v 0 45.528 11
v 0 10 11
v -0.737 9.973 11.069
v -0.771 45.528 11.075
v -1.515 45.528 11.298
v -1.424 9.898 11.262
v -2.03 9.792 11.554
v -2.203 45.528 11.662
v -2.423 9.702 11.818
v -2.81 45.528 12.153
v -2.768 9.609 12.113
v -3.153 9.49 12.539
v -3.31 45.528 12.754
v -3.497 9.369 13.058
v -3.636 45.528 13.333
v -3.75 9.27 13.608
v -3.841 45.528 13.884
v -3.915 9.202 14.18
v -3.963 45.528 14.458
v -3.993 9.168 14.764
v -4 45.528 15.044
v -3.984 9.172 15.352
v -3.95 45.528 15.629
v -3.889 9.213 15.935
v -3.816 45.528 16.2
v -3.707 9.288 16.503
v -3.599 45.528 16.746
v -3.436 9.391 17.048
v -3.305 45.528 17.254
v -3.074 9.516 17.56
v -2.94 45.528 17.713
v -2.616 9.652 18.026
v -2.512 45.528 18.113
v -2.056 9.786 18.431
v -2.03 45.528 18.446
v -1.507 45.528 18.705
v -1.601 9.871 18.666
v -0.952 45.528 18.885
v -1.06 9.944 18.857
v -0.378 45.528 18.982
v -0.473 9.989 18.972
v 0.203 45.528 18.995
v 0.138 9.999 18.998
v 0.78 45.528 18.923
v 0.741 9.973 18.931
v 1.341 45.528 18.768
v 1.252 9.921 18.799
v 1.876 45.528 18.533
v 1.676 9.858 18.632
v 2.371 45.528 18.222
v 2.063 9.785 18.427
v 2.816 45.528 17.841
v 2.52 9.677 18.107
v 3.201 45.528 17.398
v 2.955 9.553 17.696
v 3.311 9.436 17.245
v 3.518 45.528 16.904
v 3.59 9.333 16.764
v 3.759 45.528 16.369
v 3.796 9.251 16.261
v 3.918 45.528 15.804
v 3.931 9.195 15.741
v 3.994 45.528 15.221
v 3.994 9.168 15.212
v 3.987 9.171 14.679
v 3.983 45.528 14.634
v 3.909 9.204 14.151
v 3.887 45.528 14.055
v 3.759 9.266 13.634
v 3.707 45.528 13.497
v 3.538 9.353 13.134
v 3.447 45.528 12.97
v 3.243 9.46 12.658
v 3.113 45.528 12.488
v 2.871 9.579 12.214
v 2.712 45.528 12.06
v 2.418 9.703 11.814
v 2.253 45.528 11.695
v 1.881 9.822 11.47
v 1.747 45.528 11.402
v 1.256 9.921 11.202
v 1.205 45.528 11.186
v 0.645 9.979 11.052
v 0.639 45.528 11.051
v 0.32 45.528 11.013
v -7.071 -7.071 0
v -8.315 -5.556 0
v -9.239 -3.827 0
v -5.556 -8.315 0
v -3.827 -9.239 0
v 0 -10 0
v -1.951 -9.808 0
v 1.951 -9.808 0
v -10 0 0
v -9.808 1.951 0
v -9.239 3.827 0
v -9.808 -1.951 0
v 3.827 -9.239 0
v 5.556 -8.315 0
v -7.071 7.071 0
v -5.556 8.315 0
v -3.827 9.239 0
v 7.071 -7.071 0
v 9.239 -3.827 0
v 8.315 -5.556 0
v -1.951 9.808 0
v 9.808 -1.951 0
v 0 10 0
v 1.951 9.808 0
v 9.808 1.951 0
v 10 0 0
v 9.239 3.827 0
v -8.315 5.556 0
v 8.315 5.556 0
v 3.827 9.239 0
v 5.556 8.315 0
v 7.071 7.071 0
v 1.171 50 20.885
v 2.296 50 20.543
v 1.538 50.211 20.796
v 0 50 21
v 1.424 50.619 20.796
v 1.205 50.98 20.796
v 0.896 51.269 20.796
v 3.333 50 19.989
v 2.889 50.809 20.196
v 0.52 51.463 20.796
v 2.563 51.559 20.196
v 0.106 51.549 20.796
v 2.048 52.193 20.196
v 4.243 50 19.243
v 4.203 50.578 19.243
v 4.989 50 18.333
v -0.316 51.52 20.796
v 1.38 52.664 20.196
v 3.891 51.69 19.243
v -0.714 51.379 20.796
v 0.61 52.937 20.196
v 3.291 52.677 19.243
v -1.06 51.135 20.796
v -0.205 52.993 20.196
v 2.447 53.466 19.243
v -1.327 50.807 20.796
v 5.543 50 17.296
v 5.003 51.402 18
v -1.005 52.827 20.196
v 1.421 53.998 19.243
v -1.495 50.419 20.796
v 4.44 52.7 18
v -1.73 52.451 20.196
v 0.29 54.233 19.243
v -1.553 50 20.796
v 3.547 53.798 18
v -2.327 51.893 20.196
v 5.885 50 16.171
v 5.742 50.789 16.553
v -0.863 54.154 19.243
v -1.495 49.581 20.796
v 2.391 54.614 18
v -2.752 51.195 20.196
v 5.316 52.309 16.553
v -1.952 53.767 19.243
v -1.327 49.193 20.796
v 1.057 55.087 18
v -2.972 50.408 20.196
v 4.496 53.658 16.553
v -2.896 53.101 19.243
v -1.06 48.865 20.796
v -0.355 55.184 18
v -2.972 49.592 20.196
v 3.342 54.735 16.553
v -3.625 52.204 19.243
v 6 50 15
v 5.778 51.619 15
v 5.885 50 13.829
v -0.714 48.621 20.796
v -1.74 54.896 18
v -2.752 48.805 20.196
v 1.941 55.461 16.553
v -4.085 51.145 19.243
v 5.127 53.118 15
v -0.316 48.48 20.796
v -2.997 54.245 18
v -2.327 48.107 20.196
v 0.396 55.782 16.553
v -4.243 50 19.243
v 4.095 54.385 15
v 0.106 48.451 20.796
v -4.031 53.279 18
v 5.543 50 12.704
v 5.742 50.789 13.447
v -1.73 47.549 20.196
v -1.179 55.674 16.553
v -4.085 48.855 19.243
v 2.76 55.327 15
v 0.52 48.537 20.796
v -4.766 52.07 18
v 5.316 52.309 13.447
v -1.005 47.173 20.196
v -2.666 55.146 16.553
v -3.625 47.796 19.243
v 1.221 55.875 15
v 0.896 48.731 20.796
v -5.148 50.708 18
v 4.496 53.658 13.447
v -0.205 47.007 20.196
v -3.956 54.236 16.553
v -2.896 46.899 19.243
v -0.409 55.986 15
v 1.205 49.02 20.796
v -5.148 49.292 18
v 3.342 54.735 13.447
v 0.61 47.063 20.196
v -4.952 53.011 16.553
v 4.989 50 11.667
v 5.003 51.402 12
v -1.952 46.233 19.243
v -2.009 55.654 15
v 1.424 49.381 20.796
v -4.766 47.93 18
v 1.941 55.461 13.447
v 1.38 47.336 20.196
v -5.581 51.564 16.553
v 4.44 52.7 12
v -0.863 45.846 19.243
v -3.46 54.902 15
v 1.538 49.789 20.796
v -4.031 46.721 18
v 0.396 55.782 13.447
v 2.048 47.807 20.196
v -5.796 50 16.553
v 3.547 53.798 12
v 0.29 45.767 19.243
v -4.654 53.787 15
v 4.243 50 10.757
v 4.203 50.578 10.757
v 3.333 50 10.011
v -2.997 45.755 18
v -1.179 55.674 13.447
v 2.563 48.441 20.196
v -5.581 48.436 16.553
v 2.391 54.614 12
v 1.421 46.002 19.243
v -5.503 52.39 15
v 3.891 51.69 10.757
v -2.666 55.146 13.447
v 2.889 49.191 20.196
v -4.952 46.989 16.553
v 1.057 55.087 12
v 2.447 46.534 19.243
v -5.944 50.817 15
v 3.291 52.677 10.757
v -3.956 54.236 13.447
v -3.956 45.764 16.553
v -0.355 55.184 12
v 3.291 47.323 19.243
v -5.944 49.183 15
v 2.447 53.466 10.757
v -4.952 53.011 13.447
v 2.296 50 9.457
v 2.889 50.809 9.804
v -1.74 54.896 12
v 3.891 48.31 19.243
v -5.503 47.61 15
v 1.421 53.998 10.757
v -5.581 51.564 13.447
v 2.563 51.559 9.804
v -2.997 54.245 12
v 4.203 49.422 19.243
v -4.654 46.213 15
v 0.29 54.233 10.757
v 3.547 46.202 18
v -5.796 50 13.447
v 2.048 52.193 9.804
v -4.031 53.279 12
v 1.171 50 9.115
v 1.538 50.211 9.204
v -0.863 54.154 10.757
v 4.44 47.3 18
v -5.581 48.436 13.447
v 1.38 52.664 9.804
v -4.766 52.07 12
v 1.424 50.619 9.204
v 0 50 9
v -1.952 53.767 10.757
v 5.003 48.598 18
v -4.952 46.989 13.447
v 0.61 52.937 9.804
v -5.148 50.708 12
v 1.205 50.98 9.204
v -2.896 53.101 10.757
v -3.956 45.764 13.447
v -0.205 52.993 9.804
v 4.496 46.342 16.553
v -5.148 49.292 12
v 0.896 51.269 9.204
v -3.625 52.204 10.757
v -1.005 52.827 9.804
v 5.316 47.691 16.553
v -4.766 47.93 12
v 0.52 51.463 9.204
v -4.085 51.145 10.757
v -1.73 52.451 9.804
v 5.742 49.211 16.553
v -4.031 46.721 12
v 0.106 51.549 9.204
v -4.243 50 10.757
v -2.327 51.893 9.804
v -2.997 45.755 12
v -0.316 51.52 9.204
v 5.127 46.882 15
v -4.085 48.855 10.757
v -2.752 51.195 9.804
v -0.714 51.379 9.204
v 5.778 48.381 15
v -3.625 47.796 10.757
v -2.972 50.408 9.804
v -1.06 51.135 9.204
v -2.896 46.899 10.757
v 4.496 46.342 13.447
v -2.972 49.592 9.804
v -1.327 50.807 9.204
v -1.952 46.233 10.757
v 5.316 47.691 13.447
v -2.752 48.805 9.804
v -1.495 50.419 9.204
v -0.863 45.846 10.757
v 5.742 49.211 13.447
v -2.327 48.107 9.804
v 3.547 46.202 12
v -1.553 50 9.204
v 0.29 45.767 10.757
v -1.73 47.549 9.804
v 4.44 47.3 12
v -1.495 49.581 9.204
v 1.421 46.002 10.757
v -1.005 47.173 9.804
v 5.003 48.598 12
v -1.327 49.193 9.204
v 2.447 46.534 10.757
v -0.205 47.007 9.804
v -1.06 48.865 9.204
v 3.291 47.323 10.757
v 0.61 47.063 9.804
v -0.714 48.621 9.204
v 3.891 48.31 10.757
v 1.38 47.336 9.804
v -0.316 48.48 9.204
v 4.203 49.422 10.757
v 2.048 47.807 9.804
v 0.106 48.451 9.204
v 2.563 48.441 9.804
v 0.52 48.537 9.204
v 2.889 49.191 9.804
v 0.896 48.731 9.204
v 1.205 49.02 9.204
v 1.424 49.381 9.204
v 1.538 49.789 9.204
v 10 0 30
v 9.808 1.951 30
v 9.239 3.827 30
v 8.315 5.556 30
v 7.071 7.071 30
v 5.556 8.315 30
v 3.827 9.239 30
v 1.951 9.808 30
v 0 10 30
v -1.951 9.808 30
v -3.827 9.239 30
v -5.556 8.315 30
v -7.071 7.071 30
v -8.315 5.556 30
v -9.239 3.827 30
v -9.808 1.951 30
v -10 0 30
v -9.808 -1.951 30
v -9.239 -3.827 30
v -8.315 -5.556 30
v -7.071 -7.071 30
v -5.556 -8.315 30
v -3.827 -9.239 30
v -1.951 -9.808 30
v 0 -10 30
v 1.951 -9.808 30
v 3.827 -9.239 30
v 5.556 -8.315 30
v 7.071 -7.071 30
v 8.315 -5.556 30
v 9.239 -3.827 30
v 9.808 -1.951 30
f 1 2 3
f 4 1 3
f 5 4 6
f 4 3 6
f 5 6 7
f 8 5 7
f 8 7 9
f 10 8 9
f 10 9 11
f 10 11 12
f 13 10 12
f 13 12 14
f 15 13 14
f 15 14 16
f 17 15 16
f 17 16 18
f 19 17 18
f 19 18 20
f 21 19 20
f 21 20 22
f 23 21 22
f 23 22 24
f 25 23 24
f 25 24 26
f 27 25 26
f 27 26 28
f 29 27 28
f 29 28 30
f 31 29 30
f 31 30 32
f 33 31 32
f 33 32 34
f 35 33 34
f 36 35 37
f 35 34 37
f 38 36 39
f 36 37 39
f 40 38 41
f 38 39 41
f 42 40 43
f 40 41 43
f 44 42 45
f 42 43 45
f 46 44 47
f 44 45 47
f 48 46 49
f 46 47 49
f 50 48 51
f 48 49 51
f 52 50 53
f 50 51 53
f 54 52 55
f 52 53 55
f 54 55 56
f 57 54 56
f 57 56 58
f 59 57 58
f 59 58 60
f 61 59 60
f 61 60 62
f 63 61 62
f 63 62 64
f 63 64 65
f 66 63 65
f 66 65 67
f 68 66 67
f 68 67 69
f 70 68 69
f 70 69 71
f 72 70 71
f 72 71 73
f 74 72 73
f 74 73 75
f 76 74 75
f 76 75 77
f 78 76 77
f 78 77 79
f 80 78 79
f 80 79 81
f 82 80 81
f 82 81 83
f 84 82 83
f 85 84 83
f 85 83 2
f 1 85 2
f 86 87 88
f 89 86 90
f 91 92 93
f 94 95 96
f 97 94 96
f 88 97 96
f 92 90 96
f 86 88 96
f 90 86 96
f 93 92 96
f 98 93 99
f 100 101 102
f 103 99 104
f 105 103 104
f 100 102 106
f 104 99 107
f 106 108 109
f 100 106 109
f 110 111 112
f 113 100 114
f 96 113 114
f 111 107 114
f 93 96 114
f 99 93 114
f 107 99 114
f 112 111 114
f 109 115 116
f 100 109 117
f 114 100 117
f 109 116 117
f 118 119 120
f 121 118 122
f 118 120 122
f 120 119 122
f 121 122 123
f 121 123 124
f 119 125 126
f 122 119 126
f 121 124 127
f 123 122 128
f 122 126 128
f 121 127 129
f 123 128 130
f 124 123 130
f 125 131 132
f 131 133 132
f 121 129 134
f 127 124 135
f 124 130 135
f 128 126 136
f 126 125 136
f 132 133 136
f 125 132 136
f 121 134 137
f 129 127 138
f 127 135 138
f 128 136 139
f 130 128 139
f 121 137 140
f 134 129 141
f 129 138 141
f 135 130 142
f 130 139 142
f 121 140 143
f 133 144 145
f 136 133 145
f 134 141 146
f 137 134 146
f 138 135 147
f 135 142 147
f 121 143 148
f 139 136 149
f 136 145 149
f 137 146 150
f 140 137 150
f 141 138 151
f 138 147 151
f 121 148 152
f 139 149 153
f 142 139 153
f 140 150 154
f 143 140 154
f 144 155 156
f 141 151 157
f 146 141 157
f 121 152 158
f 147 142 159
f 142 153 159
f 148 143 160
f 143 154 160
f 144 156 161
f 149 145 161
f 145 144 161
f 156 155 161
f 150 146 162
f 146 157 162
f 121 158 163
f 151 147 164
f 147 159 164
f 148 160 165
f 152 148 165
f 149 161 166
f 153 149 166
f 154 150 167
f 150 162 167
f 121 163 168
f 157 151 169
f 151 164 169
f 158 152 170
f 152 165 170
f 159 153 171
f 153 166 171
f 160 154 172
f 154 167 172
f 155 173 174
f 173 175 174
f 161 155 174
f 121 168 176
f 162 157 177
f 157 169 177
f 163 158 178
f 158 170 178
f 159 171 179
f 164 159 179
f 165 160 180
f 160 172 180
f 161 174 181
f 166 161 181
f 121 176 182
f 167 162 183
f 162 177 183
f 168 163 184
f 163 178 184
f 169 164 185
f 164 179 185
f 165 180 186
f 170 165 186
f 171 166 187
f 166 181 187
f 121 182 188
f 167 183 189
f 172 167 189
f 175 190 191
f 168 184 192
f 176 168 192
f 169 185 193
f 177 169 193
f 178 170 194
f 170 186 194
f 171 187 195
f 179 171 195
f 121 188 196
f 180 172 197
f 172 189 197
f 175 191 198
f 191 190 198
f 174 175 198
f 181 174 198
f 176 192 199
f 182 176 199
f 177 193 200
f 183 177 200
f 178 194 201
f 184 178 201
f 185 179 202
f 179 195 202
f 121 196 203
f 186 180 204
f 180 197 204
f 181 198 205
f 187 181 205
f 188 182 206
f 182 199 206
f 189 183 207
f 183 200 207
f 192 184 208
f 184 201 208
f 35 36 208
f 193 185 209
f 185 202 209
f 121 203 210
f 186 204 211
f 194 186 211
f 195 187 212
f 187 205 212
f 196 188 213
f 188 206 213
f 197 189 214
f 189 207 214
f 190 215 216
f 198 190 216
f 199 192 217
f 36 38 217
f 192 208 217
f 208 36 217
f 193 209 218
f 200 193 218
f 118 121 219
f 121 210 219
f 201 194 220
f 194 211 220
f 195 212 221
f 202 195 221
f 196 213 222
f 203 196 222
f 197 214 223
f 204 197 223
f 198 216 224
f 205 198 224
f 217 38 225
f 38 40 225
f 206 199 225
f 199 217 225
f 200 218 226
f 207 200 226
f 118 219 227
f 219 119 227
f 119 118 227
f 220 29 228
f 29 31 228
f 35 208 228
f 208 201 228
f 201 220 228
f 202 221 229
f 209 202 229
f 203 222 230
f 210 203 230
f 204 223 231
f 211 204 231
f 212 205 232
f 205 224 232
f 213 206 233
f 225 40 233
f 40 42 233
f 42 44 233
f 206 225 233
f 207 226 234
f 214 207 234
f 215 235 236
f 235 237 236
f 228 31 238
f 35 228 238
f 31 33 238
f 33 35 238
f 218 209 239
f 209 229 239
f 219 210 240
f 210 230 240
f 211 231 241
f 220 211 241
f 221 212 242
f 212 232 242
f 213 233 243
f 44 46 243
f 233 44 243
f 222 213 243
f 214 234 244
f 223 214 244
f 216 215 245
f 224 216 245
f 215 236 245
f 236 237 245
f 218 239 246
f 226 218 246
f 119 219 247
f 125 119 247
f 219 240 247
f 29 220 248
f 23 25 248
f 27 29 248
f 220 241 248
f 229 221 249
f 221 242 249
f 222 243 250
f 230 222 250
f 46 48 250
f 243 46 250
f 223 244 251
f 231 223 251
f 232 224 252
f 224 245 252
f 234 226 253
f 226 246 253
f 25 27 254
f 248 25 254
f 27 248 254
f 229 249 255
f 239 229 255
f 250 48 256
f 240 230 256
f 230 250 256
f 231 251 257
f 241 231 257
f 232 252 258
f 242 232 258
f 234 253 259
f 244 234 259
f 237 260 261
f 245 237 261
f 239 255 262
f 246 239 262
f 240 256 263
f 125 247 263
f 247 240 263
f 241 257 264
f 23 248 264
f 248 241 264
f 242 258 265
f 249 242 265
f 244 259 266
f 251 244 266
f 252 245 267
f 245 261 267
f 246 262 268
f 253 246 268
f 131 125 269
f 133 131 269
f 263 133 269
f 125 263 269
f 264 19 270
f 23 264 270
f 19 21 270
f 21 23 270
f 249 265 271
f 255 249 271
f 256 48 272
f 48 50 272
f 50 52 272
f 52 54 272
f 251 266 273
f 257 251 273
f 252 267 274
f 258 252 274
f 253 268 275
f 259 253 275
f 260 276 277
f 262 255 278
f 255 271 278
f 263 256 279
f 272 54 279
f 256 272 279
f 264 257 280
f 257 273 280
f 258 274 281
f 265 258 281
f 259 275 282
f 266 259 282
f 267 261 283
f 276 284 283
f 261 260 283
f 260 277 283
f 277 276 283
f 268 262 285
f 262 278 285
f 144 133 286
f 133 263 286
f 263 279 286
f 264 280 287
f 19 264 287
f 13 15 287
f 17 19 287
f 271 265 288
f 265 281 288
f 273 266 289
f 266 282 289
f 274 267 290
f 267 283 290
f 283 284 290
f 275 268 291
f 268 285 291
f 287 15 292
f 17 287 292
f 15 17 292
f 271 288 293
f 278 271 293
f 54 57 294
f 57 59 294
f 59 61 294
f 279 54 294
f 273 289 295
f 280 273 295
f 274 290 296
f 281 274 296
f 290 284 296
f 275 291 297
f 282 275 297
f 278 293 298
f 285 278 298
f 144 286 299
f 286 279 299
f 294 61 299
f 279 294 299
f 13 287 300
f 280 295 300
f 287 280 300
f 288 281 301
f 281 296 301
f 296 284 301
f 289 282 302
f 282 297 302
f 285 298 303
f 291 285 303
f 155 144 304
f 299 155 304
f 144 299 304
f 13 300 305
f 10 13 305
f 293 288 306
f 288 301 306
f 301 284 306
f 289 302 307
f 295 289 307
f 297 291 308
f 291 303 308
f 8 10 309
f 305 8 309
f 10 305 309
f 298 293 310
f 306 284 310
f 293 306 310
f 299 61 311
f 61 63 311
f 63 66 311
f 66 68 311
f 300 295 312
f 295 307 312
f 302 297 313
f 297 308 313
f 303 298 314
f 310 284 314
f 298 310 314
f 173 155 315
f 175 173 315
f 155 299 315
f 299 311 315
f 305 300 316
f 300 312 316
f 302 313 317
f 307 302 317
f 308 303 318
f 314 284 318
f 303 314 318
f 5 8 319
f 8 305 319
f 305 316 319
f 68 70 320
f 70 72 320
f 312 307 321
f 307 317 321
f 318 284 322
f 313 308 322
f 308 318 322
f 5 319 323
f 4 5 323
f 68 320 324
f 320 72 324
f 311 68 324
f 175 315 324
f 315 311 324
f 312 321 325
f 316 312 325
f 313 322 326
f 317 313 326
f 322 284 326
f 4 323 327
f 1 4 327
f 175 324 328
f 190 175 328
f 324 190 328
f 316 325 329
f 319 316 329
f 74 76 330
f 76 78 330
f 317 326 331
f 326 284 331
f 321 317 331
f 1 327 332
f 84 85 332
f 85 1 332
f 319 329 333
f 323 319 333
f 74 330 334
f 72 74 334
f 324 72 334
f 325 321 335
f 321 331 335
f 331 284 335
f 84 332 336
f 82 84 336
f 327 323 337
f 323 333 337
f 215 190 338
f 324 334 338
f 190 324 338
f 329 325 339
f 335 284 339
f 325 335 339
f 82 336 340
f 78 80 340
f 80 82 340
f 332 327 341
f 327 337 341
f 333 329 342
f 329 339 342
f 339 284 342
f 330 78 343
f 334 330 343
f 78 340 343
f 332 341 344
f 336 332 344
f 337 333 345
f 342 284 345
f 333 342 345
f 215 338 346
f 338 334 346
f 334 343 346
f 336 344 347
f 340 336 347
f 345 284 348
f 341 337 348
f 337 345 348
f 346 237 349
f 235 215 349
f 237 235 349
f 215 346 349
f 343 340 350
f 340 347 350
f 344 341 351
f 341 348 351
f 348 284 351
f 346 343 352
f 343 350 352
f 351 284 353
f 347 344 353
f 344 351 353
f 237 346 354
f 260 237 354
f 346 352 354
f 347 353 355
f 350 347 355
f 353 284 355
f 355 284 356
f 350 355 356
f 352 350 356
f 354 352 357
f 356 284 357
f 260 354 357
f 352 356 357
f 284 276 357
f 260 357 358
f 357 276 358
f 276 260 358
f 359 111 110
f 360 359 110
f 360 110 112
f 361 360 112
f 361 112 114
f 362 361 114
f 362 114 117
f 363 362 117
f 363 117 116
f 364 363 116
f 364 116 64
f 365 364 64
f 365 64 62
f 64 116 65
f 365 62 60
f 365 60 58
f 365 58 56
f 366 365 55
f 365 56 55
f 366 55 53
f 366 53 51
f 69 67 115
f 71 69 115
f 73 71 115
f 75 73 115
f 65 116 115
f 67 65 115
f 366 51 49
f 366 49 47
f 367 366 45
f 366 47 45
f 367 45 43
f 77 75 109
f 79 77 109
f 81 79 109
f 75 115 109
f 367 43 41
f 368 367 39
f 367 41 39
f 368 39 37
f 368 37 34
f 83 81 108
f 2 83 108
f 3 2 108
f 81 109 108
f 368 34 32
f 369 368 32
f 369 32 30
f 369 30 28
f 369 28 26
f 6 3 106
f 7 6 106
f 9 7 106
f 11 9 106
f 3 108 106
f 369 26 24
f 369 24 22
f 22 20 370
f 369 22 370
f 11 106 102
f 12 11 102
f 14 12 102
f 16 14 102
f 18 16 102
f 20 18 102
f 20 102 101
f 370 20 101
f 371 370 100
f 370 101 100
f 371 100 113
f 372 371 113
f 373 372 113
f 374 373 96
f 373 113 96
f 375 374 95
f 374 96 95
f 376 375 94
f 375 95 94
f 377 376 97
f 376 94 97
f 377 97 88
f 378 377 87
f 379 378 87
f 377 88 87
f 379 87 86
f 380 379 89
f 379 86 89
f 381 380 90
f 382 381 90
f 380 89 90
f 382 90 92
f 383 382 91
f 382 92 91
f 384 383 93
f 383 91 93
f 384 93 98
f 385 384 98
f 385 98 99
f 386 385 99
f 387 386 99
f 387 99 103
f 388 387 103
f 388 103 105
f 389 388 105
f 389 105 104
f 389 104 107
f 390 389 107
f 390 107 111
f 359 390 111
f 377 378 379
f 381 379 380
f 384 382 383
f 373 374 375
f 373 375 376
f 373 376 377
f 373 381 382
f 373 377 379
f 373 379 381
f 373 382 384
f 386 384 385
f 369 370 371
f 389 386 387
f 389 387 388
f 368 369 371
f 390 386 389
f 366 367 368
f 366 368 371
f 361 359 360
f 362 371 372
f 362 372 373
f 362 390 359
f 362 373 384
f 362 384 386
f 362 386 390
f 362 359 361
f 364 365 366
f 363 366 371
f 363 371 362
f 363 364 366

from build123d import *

# Parameters (mm, degrees)
SKETCH_1_R      = 10
EXTRUDE_2_DEPTH = 30
SKETCH_2_R      = 4
EXTRUDE_3_DEPTH = 50


with BuildPart() as part:
    # 草图1 → 凸台-拉伸2 (new body)
    with BuildSketch(Plane.XY):
        Circle(SKETCH_1_R)
    extrude(amount=EXTRUDE_2_DEPTH)

    # 草图2 → 凸台-拉伸3 (add)
    with BuildSketch(Plane(origin=(0, 0, 0), x_dir=(1, 0, 0), z_dir=(0, 1, 0))):
        with Locations(Location((0, -15, 0), (0, 0, 90))):
            Circle(SKETCH_2_R)
    extrude(amount=EXTRUDE_3_DEPTH)

    # 草图3 → 旋转1 (revolve)
    with BuildSketch(Plane(origin=(0, 50, 0), x_dir=(1, 0, 0), z_dir=(0, 1, 0))):
        with BuildLine():
            Line((0, -9), (0, -21))
            ThreePointArc((0, -21), (6, -15), (0, -9))
        make_face()
    revolve(axis=Axis((0, 50, 9), (0, 0, 1)))


solid = part.part
